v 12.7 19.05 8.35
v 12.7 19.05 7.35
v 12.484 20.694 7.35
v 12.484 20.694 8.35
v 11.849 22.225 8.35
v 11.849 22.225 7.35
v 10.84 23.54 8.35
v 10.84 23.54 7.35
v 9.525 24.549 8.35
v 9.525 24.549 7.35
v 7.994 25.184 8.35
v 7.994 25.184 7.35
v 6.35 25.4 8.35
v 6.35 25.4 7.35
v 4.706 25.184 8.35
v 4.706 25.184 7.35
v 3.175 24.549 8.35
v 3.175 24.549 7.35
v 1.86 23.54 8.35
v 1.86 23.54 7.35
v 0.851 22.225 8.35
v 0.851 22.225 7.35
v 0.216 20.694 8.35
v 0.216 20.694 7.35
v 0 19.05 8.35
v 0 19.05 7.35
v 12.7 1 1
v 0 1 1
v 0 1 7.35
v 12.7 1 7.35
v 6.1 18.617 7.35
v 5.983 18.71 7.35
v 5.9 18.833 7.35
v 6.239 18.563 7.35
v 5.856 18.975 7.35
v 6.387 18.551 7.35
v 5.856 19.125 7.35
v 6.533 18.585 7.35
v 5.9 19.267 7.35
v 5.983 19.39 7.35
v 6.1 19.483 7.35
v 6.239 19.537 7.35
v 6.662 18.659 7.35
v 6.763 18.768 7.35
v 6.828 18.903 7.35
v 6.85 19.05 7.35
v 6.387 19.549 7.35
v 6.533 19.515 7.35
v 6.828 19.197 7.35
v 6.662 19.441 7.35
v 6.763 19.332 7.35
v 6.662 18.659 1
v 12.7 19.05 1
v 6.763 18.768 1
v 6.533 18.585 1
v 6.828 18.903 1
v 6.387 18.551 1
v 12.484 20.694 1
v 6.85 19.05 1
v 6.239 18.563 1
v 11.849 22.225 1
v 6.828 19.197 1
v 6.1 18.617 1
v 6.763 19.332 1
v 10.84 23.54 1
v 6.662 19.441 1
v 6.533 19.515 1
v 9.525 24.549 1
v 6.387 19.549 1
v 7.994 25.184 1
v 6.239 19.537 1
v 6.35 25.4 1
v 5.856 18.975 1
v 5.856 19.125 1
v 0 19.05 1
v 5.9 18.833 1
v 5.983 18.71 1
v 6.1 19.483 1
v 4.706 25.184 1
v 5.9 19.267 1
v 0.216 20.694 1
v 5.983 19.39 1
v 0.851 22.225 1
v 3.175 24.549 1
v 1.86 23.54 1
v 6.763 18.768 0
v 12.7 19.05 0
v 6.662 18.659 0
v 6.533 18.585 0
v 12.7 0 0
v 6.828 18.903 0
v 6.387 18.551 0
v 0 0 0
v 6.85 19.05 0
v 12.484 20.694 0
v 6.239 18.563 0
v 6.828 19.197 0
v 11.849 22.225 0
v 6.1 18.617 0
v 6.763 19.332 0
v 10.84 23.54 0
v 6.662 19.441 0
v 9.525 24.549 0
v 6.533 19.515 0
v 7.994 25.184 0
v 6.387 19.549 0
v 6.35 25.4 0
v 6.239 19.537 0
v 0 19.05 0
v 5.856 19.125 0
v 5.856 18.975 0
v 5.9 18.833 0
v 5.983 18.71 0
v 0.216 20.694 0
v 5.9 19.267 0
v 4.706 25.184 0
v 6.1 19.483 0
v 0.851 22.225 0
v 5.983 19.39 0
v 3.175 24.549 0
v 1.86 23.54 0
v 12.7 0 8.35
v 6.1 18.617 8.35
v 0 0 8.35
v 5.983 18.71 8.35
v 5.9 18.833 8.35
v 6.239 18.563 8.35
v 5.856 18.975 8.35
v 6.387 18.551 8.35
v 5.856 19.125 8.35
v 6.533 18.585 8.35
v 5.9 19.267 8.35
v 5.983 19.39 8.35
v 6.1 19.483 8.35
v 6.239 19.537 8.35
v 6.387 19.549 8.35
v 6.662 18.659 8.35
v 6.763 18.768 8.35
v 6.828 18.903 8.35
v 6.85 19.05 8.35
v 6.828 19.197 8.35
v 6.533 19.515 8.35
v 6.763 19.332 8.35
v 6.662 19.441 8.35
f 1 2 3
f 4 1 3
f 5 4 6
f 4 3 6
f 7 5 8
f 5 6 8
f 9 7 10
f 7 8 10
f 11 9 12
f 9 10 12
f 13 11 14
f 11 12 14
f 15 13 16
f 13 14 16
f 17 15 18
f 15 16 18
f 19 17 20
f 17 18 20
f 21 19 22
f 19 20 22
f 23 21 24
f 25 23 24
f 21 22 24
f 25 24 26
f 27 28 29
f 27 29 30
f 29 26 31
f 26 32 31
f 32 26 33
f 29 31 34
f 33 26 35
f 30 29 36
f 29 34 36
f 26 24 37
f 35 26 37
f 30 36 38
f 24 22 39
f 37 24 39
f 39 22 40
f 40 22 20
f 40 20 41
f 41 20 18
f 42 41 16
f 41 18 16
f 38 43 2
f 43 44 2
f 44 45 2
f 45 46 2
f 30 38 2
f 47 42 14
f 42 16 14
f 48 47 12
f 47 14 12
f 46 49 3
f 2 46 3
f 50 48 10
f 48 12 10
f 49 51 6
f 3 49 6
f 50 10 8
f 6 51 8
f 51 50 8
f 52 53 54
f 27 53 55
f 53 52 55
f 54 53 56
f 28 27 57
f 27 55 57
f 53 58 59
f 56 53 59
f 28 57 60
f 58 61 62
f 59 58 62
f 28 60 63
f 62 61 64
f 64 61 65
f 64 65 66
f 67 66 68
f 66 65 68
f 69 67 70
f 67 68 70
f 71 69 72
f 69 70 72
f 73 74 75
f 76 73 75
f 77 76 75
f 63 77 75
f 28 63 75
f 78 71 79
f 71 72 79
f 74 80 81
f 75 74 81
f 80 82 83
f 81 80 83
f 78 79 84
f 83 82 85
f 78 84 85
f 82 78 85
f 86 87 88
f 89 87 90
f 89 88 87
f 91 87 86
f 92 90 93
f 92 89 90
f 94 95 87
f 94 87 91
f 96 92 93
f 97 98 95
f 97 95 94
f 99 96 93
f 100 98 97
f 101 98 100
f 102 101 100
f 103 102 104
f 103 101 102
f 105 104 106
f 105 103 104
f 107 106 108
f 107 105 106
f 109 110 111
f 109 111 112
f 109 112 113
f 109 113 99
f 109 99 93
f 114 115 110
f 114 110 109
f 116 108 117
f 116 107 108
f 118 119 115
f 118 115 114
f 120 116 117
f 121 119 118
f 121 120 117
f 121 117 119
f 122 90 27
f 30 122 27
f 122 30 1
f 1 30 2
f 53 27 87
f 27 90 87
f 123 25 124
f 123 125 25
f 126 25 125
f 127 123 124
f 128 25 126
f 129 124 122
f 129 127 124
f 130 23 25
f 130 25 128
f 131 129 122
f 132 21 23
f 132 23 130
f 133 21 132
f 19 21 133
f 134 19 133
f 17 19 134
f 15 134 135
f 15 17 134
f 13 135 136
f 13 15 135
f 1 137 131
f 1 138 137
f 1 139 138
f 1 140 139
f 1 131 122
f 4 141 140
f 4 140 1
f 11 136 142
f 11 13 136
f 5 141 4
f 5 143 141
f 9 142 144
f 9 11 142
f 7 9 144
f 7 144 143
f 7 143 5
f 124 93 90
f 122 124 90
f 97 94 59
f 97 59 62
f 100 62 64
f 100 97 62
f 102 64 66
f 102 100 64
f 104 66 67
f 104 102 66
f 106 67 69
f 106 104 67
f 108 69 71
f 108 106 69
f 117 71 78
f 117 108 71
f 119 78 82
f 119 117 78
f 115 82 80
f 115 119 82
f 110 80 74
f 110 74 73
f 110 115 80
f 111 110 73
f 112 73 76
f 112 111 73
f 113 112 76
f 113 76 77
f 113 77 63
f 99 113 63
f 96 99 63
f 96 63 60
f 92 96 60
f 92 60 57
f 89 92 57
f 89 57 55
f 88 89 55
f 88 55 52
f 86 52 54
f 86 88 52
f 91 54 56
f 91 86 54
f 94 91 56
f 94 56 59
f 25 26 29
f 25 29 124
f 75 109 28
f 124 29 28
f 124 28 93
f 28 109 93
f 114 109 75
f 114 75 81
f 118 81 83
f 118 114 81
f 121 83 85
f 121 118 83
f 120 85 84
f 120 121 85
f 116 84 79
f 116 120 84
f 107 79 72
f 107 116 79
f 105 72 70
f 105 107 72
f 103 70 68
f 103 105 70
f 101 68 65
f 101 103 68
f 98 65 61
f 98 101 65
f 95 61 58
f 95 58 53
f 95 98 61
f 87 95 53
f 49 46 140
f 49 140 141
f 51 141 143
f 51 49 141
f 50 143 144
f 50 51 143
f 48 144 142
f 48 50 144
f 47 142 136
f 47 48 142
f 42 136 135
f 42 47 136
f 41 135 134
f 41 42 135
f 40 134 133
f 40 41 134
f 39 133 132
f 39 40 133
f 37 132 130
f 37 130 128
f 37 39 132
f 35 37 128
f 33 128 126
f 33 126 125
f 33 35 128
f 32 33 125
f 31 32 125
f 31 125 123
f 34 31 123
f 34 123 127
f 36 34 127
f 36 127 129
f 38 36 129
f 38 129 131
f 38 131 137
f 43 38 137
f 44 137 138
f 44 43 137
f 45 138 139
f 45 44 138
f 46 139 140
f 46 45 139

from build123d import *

# Parameters (mm, degrees)
SKETCH1_R           = 0.5
BOSS_EXTRUDE1_DEPTH = 1
SKETCH2_W           = 12.7
SKETCH2_H           = 1
BOSS_EXTRUDE2_DEPTH = 6.35
SKETCH3_R           = 0.5
BOSS_EXTRUDE3_DEPTH = 1


with BuildPart() as part:
    # Sketch1 → Boss-Extrude1 (new body)
    with BuildSketch(Plane.XY):
        with BuildLine():
            Line((0, 0), (0, 19.05))
            ThreePointArc((0, 19.05), (6.35, 25.4), (12.7, 19.05))
            Line((12.7, 19.05), (12.7, 0))
            Line((12.7, 0), (0, 0))
        make_face()
        with Locations((6.35, 19.05)):
            Circle(SKETCH1_R, mode=Mode.SUBTRACT)
    extrude(amount=BOSS_EXTRUDE1_DEPTH)

    # Sketch2 → Boss-Extrude2 (add)
    with BuildSketch(Plane.XY.offset(1)):
        with Locations((6.35, 0.5)):
            Rectangle(SKETCH2_W, SKETCH2_H)
    extrude(amount=BOSS_EXTRUDE2_DEPTH)

    # Sketch3 → Boss-Extrude3 (add)
    with BuildSketch(Plane.XY.offset(7.35)):
        with BuildLine():
            Line((0, 0), (12.7, 0))
            Line((12.7, 0), (12.7, 19.05))
            ThreePointArc((12.7, 19.05), (6.35, 25.4), (0, 19.05))
            Line((0, 19.05), (0, 0))
        make_face()
        with Locations((6.35, 19.05)):
            Circle(SKETCH3_R, mode=Mode.SUBTRACT)
    extrude(amount=BOSS_EXTRUDE3_DEPTH)


solid = part.part
